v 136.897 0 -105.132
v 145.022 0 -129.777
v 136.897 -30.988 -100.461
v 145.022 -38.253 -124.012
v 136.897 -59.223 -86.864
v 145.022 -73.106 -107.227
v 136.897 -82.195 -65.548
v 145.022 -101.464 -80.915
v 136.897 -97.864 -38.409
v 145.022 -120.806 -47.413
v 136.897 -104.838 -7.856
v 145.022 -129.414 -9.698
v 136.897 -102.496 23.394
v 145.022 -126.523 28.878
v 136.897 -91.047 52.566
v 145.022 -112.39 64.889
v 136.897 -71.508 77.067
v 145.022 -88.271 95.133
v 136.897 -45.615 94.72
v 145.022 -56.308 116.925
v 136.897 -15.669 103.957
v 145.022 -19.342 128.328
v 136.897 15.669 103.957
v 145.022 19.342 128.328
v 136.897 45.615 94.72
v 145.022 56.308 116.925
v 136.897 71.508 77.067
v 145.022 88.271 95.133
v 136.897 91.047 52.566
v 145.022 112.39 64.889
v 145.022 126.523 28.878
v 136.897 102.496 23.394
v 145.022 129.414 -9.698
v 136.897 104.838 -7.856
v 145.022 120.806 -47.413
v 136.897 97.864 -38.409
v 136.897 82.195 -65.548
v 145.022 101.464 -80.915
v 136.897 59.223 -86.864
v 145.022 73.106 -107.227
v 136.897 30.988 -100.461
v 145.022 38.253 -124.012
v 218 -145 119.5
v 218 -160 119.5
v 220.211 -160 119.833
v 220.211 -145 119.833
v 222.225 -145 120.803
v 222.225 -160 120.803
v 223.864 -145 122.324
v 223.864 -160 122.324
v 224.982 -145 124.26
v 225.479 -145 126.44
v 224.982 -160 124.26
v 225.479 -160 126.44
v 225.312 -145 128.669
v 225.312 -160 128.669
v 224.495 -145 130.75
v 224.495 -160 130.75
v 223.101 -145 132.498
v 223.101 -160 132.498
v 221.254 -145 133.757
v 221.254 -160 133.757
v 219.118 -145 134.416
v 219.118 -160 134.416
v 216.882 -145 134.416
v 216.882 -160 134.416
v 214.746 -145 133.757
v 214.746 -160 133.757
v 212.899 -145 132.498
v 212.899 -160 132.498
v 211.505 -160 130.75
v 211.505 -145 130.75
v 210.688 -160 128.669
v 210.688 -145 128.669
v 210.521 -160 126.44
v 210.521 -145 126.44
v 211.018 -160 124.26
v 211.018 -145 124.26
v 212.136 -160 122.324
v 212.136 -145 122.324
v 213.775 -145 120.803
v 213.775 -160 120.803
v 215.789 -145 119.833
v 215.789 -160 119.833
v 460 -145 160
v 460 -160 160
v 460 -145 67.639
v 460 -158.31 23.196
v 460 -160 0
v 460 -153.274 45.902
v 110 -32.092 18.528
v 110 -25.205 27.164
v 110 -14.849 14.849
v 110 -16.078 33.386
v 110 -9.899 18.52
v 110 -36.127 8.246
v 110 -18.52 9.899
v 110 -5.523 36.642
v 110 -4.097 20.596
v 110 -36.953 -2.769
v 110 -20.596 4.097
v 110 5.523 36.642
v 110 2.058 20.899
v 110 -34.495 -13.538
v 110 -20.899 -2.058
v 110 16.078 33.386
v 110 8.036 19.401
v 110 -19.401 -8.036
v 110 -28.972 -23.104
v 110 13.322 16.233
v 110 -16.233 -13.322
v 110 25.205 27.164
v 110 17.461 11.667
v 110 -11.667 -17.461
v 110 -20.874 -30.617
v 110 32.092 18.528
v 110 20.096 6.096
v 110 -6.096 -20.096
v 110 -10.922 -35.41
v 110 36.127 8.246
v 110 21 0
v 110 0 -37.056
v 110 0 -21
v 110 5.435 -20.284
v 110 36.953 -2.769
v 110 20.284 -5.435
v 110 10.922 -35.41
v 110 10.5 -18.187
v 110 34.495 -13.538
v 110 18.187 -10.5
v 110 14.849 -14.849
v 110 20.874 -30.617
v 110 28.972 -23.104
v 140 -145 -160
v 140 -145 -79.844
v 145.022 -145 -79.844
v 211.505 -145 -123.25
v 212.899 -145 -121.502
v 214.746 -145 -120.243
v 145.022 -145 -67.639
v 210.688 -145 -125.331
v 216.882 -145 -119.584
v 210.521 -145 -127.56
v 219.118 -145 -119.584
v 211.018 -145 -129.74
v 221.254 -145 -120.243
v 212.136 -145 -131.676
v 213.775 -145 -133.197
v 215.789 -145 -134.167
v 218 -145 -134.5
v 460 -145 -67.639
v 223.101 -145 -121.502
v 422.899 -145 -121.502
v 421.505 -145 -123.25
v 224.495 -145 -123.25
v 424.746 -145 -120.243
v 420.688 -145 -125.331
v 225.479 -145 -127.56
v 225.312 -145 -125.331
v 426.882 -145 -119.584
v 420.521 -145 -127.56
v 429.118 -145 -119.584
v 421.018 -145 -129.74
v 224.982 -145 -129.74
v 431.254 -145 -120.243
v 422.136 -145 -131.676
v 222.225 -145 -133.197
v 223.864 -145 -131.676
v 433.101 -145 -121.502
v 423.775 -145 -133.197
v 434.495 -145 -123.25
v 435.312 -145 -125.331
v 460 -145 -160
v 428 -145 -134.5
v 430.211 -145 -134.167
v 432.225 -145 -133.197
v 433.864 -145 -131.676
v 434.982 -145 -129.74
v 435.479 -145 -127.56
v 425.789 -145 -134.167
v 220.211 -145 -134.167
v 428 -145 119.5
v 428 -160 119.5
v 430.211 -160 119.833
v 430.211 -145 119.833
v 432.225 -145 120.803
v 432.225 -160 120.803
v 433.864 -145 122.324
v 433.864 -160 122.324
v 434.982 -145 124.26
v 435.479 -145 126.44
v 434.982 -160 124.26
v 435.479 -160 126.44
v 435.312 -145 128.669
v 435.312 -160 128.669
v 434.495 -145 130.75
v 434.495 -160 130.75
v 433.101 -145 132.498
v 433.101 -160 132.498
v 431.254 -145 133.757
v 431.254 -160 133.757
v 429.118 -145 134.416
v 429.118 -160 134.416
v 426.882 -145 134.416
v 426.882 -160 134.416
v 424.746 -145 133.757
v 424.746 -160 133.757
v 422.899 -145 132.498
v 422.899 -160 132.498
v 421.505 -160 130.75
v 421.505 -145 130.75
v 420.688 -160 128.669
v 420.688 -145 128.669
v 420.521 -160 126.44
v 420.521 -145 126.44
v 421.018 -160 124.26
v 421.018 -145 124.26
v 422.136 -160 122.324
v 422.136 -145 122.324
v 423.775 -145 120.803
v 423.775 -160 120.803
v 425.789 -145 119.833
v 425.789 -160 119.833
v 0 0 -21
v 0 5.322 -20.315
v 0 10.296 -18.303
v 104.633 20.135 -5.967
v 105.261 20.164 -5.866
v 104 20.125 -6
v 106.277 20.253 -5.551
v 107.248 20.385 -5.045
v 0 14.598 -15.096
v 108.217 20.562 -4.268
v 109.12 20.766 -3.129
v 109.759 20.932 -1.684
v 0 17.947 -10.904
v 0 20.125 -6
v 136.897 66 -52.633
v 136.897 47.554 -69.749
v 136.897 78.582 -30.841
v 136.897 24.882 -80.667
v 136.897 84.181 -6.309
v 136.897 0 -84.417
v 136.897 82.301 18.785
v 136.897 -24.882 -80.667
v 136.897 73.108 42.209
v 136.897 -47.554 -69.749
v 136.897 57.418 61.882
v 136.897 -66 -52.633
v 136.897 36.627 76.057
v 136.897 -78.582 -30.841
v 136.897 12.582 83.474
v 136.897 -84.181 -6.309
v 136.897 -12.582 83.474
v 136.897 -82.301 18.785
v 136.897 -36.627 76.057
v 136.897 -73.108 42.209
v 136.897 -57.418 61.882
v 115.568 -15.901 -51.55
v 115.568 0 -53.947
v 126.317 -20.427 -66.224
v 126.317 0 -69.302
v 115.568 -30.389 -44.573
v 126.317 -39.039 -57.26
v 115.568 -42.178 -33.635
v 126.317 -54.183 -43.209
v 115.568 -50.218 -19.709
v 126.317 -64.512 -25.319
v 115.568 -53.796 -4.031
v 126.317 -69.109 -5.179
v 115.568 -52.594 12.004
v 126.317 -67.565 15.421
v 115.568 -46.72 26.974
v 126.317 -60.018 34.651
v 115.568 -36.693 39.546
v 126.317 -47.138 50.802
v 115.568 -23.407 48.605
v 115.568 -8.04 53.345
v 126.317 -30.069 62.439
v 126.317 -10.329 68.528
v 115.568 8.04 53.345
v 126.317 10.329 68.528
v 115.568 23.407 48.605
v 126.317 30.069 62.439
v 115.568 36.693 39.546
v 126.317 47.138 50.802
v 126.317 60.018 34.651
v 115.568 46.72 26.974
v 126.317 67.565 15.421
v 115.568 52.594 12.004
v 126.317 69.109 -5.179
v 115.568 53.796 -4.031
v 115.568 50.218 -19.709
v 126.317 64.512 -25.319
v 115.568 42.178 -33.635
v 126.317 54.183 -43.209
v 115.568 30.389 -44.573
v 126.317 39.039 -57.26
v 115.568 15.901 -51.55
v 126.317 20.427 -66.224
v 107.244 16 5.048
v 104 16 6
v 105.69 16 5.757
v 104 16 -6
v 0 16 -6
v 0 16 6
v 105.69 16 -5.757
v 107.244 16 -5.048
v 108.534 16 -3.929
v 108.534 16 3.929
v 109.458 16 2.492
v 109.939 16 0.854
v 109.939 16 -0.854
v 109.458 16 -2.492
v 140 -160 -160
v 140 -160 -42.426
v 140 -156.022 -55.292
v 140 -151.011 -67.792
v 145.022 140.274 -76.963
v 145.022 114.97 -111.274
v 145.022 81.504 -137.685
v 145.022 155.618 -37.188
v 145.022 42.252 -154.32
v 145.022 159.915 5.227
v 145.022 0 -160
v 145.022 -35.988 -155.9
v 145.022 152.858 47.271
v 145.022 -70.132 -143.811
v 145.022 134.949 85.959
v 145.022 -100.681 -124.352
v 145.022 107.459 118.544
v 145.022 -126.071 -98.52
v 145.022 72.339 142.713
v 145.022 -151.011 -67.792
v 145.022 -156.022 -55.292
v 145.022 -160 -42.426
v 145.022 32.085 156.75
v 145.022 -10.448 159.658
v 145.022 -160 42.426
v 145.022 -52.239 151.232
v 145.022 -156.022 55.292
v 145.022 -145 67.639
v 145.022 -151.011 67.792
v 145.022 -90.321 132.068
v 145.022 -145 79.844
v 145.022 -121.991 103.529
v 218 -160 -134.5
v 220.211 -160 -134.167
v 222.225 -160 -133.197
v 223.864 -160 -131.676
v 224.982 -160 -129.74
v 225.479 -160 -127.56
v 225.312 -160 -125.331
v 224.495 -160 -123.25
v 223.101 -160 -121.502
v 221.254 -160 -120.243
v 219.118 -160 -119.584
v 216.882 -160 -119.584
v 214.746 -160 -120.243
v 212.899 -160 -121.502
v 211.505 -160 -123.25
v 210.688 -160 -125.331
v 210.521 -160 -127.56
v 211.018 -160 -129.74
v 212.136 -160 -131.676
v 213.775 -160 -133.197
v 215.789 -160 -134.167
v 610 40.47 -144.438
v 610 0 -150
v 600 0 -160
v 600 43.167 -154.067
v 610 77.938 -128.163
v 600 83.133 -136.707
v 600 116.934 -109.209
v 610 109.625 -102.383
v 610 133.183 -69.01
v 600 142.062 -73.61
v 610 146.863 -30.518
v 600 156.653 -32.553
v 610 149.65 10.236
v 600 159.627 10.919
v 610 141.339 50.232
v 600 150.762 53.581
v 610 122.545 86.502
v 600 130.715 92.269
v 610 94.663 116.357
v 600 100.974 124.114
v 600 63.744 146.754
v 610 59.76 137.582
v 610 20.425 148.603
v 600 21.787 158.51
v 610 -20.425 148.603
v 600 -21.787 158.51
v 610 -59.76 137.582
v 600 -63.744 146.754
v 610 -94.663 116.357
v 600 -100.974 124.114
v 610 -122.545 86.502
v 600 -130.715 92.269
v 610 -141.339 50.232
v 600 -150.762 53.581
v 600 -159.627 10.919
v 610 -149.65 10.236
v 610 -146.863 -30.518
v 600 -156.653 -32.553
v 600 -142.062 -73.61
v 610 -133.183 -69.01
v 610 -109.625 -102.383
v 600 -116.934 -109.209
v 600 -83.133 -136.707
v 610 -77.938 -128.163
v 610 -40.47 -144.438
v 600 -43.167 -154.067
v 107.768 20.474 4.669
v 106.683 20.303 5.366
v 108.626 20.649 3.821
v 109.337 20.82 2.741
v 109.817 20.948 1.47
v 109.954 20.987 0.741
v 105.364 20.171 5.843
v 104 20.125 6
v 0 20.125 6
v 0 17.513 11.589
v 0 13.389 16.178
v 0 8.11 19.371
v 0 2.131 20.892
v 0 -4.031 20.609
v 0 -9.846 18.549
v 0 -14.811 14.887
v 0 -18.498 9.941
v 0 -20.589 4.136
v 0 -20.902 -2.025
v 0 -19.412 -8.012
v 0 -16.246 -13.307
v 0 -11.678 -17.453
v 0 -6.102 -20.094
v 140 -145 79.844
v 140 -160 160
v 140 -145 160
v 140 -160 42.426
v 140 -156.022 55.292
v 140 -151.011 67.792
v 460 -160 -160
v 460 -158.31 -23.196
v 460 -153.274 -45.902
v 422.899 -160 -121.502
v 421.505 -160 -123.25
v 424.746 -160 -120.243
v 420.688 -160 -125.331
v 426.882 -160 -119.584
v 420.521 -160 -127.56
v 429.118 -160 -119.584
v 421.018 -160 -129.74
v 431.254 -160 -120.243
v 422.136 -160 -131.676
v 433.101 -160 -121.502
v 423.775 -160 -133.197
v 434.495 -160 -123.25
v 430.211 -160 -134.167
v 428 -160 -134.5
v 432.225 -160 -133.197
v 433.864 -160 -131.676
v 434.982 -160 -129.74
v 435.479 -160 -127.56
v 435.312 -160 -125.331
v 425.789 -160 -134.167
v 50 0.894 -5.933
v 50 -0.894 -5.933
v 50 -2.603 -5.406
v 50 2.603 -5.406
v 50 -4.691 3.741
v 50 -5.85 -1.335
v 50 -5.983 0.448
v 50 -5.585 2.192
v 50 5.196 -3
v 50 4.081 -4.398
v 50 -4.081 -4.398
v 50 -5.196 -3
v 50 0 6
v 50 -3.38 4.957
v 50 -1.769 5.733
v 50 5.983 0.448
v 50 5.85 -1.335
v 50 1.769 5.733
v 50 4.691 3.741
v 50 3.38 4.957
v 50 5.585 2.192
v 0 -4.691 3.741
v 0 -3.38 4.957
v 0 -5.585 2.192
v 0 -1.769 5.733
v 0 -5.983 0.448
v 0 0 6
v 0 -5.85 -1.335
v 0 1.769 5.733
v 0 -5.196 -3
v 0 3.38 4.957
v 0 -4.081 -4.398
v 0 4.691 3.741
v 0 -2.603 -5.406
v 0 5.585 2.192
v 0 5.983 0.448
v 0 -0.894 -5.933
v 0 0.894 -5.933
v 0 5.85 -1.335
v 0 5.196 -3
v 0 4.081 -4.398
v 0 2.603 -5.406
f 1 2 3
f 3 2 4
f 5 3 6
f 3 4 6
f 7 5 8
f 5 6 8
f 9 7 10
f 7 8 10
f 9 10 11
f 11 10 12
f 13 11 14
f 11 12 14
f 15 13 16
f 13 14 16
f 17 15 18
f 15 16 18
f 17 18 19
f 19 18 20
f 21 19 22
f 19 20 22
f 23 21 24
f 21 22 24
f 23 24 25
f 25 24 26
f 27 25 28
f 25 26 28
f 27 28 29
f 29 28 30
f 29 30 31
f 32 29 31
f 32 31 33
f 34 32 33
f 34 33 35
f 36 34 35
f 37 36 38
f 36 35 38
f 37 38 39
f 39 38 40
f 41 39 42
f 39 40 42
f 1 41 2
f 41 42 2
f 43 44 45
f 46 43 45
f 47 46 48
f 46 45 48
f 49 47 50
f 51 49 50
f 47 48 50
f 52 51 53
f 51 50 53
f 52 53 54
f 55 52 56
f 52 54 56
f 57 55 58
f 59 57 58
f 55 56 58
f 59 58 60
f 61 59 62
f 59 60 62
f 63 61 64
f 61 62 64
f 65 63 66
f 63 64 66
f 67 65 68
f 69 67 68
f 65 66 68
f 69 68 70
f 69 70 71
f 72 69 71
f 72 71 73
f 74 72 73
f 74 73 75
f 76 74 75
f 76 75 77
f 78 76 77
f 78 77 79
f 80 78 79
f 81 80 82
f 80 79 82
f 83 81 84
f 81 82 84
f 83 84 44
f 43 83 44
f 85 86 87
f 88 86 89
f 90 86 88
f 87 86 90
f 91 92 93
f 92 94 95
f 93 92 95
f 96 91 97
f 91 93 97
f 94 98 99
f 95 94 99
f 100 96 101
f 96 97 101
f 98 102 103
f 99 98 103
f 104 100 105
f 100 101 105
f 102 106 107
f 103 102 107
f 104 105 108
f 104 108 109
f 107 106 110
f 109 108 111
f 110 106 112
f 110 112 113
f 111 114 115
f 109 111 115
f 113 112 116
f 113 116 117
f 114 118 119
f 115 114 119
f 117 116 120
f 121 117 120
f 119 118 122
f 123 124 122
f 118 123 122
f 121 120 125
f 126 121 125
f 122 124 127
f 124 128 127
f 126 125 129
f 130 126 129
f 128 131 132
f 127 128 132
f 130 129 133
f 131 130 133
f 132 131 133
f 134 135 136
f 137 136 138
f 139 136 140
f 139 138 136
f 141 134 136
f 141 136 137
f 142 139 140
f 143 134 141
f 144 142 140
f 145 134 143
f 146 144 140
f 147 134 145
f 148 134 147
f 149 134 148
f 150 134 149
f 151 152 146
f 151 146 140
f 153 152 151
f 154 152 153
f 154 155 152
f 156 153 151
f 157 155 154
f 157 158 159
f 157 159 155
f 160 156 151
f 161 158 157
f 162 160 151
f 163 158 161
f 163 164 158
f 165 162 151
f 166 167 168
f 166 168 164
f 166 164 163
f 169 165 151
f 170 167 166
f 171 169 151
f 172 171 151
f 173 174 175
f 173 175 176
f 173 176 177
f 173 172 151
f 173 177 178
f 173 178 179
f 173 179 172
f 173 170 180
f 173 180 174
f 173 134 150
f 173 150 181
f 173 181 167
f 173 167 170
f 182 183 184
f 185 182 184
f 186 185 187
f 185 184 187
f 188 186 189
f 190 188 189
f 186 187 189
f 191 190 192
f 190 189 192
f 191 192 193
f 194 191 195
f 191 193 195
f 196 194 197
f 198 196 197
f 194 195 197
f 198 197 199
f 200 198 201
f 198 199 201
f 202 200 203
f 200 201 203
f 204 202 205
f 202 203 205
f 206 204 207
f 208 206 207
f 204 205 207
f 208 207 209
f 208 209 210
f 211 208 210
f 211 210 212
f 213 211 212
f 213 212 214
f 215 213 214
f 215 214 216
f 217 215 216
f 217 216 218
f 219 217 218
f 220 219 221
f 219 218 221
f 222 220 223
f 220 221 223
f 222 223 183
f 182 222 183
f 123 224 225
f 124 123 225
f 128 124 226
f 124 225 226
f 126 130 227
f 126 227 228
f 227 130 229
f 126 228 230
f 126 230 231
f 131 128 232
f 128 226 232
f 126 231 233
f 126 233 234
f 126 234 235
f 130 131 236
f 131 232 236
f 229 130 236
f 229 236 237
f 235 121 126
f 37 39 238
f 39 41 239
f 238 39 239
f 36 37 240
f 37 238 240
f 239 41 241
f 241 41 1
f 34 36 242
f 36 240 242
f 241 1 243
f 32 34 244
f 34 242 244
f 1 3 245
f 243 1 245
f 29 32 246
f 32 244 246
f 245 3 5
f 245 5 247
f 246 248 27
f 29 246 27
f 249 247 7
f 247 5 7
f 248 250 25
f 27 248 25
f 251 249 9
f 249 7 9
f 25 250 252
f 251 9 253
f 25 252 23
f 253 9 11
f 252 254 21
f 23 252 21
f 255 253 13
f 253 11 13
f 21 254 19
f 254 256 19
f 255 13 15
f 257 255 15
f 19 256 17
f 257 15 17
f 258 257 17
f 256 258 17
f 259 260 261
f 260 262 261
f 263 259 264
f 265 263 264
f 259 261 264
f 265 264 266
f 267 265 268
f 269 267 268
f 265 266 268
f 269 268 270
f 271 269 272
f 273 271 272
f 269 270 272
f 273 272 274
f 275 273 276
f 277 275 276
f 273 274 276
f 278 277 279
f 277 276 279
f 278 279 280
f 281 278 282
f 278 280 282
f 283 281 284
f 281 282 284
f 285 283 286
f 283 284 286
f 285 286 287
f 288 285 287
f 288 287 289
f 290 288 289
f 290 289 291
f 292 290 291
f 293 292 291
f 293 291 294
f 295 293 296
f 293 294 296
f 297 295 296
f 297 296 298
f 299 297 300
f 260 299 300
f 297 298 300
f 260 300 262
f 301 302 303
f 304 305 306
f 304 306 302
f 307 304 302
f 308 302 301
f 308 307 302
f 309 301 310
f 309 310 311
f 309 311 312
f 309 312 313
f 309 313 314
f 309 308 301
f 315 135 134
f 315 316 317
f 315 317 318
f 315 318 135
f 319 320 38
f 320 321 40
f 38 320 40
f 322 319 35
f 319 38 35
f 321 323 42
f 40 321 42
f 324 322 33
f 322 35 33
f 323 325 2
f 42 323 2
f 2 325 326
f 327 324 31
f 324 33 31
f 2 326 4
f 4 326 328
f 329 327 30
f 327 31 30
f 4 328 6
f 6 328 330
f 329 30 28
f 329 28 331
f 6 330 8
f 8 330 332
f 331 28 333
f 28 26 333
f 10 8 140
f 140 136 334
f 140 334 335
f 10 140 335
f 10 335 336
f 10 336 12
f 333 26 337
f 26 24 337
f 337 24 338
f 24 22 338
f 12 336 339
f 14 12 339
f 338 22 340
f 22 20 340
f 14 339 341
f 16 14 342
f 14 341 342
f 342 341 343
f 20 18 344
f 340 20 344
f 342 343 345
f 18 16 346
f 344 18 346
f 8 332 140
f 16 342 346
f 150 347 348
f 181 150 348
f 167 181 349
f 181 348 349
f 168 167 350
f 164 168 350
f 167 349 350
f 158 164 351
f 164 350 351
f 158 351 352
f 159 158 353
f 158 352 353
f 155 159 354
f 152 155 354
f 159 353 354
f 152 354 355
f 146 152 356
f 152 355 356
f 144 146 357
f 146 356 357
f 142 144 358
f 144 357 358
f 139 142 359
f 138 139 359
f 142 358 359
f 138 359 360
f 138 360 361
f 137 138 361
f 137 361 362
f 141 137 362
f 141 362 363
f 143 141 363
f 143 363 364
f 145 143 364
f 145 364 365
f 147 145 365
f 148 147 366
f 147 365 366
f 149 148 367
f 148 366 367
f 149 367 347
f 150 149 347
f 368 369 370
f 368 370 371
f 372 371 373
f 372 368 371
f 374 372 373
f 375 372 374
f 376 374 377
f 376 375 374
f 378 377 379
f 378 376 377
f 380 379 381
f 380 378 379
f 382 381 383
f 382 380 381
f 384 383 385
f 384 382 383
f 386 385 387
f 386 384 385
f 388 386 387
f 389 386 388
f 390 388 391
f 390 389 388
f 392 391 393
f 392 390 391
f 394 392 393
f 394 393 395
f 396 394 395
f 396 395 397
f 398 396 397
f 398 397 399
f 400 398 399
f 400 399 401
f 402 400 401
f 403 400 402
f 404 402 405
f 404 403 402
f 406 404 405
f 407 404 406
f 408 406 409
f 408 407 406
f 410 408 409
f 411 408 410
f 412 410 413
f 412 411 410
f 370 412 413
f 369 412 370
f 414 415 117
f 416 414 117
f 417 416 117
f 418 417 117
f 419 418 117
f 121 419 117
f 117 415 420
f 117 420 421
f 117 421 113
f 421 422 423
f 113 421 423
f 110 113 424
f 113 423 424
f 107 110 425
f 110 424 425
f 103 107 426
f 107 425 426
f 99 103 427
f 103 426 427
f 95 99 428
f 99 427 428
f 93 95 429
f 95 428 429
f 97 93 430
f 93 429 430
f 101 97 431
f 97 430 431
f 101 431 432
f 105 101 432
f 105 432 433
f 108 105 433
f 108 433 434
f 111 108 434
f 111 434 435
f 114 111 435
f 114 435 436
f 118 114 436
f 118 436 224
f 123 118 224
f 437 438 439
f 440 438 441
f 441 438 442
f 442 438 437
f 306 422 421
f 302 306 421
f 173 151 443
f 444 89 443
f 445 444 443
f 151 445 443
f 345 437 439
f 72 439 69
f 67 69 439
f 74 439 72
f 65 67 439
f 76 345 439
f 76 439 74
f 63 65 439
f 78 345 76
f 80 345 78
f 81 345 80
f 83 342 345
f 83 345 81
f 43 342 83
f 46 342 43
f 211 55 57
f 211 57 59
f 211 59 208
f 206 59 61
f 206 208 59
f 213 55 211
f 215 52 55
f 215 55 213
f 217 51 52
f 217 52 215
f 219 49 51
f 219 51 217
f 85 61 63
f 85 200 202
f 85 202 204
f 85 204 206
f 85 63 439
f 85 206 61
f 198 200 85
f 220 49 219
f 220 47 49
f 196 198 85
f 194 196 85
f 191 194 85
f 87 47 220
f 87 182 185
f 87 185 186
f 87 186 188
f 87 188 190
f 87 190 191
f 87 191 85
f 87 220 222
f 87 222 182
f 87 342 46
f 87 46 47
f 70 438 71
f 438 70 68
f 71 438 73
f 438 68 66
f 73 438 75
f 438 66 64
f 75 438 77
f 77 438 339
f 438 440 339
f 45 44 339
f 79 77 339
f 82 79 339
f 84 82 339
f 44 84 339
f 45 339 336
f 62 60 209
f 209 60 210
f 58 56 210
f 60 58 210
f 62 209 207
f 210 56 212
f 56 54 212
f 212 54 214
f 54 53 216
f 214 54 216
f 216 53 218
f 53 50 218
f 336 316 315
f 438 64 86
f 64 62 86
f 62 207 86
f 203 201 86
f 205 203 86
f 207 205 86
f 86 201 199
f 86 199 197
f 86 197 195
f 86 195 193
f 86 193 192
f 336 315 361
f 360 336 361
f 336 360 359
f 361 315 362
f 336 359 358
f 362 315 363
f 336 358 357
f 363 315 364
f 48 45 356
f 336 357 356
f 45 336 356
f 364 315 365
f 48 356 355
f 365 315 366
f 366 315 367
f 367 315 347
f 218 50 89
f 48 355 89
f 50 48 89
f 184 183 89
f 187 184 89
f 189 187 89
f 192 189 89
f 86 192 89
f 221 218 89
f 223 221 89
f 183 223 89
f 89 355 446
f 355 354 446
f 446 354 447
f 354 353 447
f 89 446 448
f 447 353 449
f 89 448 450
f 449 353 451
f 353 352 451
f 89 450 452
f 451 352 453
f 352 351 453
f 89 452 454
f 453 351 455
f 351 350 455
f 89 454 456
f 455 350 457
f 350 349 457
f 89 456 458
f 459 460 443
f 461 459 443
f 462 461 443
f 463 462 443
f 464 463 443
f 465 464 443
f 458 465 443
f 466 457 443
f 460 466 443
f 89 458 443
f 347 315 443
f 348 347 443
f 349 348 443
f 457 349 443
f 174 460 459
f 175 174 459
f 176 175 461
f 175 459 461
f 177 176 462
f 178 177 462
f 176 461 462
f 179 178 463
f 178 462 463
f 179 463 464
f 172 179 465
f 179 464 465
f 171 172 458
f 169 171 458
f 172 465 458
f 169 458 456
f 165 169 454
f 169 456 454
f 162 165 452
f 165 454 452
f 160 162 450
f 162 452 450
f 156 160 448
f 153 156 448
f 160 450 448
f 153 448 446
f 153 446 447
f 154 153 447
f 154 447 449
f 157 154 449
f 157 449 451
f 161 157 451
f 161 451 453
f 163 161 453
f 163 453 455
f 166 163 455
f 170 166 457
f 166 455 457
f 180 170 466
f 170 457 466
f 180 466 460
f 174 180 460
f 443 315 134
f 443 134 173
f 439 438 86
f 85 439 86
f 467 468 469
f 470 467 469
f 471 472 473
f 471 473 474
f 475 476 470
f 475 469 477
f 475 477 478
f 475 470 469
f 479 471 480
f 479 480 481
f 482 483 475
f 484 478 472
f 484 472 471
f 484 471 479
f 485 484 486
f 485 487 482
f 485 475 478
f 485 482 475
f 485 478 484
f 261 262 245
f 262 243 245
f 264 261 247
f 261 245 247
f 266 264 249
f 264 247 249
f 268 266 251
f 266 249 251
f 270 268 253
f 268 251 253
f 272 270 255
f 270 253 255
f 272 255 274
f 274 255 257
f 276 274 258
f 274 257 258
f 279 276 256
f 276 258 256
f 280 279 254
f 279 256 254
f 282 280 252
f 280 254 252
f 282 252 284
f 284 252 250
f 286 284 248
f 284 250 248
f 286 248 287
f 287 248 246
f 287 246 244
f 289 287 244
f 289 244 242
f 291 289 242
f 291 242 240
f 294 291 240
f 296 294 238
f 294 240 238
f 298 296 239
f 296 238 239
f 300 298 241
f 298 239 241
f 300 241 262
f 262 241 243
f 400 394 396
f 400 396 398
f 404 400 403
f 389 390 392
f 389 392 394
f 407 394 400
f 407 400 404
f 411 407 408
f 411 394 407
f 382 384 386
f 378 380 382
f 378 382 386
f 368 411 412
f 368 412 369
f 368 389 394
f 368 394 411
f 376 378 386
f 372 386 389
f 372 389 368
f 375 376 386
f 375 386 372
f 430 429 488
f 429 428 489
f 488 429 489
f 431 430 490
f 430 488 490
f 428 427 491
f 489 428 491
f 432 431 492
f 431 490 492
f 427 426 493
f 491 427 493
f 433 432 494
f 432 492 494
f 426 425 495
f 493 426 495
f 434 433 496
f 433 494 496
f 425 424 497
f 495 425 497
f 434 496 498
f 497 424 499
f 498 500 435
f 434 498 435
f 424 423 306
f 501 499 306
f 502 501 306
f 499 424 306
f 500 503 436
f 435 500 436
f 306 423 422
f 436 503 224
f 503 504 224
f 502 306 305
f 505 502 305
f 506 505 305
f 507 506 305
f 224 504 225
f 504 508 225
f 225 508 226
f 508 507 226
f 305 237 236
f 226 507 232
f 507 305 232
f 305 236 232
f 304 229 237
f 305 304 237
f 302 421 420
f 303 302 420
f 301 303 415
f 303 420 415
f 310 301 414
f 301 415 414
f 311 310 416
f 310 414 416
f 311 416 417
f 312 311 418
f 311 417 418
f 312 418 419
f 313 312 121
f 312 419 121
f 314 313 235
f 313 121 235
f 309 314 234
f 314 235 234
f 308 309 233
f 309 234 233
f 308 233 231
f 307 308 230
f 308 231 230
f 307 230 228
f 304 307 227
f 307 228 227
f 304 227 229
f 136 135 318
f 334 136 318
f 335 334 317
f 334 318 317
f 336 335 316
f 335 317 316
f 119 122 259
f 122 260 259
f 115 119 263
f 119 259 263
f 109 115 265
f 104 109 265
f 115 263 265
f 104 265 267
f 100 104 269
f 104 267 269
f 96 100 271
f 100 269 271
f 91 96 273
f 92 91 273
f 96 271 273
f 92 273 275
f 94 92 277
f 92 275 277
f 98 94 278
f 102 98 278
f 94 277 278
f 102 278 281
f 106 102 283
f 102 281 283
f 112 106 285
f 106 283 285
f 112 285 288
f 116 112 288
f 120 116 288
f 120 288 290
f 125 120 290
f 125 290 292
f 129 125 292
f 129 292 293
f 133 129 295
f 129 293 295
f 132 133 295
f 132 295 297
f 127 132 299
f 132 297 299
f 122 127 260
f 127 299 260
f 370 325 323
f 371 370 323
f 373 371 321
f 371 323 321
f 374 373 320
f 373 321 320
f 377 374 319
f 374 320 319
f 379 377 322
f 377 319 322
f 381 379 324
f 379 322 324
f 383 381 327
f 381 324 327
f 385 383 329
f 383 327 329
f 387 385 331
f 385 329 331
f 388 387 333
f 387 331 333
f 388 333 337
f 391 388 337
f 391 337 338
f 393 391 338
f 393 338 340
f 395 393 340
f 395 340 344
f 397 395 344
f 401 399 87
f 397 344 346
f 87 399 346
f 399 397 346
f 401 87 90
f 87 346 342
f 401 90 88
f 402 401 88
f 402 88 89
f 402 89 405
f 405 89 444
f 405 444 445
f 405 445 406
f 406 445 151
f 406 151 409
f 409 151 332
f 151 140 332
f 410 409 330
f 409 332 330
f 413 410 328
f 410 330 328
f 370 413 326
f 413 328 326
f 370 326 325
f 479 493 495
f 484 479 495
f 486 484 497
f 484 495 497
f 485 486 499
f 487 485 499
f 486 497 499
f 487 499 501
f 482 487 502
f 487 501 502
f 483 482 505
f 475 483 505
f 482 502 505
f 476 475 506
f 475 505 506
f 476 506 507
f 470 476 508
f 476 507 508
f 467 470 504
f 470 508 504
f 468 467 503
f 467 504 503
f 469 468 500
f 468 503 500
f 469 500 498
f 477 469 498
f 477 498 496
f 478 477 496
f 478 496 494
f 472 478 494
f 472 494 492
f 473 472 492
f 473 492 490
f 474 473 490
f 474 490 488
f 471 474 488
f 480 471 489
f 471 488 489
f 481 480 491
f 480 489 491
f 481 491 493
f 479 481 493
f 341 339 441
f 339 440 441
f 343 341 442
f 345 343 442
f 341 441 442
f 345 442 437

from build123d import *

# Parameters (mm, degrees)
SKETCH1_R           = 21
BOSS_EXTRUDE1_DEPTH = 110
SKETCH2_R           = 160
BOSS_EXTRUDE2_DEPTH = 500
SKETCH3_W           = 320
SKETCH3_H           = 320
BOSS_EXTRUDE3_DEPTH = 15
SKETCH4_R           = 7.5
CUT_EXTRUDE1_DEPTH  = 15
CHAMFER1_SIZE       = 10
CUT_EXTRUDE2_DEPTH  = 5
SKETCH7_R           = 6
CUT_EXTRUDE3_DEPTH  = 50


with BuildPart() as part:
    # Sketch1 → Boss-Extrude1 (new body)
    with BuildSketch(Plane(origin=(0, 0, 0), x_dir=(0, 0, -1), z_dir=(1, 0, 0))):
        Circle(SKETCH1_R)
    extrude(amount=BOSS_EXTRUDE1_DEPTH)

    # Sketch2 → Boss-Extrude2 (add)
    with BuildSketch(Plane(origin=(110, 0, 0), x_dir=(0, 0, -1), z_dir=(1, 0, 0))):
        Circle(SKETCH2_R)
    extrude(amount=BOSS_EXTRUDE2_DEPTH)

    # Sketch3 → Boss-Extrude3 (add)
    with BuildSketch(Plane(origin=(0, -160, 0), x_dir=(1, 0, 0), z_dir=(0, 1, 0))):
        with Locations((300, 0)):
            Rectangle(SKETCH3_W, SKETCH3_H)
    extrude(amount=BOSS_EXTRUDE3_DEPTH)

    # Sketch4 → Cut-Extrude1 (cut)
    with BuildSketch(Plane.XZ.offset(160)):
        with Locations(Location((428, 127, 0), (0, 0, 270))):
            Circle(SKETCH4_R)
        with Locations(Location((218, 127, 0), (0, 0, 270))):
            Circle(SKETCH4_R)
        with Locations(Location((218, -127, 0), (0, 0, 270))):
            Circle(SKETCH4_R)
        with Locations(Location((428, -127, 0), (0, 0, 270))):
            Circle(SKETCH4_R)
    extrude(amount=-CUT_EXTRUDE1_DEPTH, mode=Mode.SUBTRACT)

    # Chamfer1
    chamfer1_edges = [part.edges().sort_by_distance(p)[0] for p in [
        (110, 0, 160),
        (610, 0, 160),
    ]]
    chamfer(chamfer1_edges, length=CHAMFER1_SIZE)

    # Sketch5 → Cut-Revolve1 (revolve, cut)
    with BuildSketch(Plane.XY, mode=Mode.PRIVATE) as cut_revolve1_sk:
        Polygon((145.021608212, 165.529428324), (110, 165.529428324), (110, 37.056137485), (115.568052014, 53.947048233), (126.316813399, 69.30242164), (136.897249661, 84.417330587), (136.897249661, 105.131626256), (145.021608212, 129.777196164), align=None)
    revolve(cut_revolve1_sk.sketch.rotate(Axis((0, 0, 0), (-1, 0, 0)), 90), axis=Axis((0, 0, 0), (-1, 0, 0)), mode=Mode.SUBTRACT)

    # Sketch6 → Cut-Extrude2 (cut)
    with BuildSketch(Plane(origin=(0, 21, 0), x_dir=(1, 0, 0), z_dir=(0, 1, 0))):
        with BuildLine():
            Line((104, 6), (0, 6))
            Line((0, 6), (0, -6))
            Line((0, -6), (104, -6))
            ThreePointArc((104, -6), (110, 0), (104, 6))
        make_face()
    extrude(amount=-CUT_EXTRUDE2_DEPTH, mode=Mode.SUBTRACT)

    # Sketch7 → Cut-Extrude3 (cut)
    with BuildSketch(Plane.ZY):
        Circle(SKETCH7_R)
    extrude(amount=-CUT_EXTRUDE3_DEPTH, mode=Mode.SUBTRACT)


solid = part.part
